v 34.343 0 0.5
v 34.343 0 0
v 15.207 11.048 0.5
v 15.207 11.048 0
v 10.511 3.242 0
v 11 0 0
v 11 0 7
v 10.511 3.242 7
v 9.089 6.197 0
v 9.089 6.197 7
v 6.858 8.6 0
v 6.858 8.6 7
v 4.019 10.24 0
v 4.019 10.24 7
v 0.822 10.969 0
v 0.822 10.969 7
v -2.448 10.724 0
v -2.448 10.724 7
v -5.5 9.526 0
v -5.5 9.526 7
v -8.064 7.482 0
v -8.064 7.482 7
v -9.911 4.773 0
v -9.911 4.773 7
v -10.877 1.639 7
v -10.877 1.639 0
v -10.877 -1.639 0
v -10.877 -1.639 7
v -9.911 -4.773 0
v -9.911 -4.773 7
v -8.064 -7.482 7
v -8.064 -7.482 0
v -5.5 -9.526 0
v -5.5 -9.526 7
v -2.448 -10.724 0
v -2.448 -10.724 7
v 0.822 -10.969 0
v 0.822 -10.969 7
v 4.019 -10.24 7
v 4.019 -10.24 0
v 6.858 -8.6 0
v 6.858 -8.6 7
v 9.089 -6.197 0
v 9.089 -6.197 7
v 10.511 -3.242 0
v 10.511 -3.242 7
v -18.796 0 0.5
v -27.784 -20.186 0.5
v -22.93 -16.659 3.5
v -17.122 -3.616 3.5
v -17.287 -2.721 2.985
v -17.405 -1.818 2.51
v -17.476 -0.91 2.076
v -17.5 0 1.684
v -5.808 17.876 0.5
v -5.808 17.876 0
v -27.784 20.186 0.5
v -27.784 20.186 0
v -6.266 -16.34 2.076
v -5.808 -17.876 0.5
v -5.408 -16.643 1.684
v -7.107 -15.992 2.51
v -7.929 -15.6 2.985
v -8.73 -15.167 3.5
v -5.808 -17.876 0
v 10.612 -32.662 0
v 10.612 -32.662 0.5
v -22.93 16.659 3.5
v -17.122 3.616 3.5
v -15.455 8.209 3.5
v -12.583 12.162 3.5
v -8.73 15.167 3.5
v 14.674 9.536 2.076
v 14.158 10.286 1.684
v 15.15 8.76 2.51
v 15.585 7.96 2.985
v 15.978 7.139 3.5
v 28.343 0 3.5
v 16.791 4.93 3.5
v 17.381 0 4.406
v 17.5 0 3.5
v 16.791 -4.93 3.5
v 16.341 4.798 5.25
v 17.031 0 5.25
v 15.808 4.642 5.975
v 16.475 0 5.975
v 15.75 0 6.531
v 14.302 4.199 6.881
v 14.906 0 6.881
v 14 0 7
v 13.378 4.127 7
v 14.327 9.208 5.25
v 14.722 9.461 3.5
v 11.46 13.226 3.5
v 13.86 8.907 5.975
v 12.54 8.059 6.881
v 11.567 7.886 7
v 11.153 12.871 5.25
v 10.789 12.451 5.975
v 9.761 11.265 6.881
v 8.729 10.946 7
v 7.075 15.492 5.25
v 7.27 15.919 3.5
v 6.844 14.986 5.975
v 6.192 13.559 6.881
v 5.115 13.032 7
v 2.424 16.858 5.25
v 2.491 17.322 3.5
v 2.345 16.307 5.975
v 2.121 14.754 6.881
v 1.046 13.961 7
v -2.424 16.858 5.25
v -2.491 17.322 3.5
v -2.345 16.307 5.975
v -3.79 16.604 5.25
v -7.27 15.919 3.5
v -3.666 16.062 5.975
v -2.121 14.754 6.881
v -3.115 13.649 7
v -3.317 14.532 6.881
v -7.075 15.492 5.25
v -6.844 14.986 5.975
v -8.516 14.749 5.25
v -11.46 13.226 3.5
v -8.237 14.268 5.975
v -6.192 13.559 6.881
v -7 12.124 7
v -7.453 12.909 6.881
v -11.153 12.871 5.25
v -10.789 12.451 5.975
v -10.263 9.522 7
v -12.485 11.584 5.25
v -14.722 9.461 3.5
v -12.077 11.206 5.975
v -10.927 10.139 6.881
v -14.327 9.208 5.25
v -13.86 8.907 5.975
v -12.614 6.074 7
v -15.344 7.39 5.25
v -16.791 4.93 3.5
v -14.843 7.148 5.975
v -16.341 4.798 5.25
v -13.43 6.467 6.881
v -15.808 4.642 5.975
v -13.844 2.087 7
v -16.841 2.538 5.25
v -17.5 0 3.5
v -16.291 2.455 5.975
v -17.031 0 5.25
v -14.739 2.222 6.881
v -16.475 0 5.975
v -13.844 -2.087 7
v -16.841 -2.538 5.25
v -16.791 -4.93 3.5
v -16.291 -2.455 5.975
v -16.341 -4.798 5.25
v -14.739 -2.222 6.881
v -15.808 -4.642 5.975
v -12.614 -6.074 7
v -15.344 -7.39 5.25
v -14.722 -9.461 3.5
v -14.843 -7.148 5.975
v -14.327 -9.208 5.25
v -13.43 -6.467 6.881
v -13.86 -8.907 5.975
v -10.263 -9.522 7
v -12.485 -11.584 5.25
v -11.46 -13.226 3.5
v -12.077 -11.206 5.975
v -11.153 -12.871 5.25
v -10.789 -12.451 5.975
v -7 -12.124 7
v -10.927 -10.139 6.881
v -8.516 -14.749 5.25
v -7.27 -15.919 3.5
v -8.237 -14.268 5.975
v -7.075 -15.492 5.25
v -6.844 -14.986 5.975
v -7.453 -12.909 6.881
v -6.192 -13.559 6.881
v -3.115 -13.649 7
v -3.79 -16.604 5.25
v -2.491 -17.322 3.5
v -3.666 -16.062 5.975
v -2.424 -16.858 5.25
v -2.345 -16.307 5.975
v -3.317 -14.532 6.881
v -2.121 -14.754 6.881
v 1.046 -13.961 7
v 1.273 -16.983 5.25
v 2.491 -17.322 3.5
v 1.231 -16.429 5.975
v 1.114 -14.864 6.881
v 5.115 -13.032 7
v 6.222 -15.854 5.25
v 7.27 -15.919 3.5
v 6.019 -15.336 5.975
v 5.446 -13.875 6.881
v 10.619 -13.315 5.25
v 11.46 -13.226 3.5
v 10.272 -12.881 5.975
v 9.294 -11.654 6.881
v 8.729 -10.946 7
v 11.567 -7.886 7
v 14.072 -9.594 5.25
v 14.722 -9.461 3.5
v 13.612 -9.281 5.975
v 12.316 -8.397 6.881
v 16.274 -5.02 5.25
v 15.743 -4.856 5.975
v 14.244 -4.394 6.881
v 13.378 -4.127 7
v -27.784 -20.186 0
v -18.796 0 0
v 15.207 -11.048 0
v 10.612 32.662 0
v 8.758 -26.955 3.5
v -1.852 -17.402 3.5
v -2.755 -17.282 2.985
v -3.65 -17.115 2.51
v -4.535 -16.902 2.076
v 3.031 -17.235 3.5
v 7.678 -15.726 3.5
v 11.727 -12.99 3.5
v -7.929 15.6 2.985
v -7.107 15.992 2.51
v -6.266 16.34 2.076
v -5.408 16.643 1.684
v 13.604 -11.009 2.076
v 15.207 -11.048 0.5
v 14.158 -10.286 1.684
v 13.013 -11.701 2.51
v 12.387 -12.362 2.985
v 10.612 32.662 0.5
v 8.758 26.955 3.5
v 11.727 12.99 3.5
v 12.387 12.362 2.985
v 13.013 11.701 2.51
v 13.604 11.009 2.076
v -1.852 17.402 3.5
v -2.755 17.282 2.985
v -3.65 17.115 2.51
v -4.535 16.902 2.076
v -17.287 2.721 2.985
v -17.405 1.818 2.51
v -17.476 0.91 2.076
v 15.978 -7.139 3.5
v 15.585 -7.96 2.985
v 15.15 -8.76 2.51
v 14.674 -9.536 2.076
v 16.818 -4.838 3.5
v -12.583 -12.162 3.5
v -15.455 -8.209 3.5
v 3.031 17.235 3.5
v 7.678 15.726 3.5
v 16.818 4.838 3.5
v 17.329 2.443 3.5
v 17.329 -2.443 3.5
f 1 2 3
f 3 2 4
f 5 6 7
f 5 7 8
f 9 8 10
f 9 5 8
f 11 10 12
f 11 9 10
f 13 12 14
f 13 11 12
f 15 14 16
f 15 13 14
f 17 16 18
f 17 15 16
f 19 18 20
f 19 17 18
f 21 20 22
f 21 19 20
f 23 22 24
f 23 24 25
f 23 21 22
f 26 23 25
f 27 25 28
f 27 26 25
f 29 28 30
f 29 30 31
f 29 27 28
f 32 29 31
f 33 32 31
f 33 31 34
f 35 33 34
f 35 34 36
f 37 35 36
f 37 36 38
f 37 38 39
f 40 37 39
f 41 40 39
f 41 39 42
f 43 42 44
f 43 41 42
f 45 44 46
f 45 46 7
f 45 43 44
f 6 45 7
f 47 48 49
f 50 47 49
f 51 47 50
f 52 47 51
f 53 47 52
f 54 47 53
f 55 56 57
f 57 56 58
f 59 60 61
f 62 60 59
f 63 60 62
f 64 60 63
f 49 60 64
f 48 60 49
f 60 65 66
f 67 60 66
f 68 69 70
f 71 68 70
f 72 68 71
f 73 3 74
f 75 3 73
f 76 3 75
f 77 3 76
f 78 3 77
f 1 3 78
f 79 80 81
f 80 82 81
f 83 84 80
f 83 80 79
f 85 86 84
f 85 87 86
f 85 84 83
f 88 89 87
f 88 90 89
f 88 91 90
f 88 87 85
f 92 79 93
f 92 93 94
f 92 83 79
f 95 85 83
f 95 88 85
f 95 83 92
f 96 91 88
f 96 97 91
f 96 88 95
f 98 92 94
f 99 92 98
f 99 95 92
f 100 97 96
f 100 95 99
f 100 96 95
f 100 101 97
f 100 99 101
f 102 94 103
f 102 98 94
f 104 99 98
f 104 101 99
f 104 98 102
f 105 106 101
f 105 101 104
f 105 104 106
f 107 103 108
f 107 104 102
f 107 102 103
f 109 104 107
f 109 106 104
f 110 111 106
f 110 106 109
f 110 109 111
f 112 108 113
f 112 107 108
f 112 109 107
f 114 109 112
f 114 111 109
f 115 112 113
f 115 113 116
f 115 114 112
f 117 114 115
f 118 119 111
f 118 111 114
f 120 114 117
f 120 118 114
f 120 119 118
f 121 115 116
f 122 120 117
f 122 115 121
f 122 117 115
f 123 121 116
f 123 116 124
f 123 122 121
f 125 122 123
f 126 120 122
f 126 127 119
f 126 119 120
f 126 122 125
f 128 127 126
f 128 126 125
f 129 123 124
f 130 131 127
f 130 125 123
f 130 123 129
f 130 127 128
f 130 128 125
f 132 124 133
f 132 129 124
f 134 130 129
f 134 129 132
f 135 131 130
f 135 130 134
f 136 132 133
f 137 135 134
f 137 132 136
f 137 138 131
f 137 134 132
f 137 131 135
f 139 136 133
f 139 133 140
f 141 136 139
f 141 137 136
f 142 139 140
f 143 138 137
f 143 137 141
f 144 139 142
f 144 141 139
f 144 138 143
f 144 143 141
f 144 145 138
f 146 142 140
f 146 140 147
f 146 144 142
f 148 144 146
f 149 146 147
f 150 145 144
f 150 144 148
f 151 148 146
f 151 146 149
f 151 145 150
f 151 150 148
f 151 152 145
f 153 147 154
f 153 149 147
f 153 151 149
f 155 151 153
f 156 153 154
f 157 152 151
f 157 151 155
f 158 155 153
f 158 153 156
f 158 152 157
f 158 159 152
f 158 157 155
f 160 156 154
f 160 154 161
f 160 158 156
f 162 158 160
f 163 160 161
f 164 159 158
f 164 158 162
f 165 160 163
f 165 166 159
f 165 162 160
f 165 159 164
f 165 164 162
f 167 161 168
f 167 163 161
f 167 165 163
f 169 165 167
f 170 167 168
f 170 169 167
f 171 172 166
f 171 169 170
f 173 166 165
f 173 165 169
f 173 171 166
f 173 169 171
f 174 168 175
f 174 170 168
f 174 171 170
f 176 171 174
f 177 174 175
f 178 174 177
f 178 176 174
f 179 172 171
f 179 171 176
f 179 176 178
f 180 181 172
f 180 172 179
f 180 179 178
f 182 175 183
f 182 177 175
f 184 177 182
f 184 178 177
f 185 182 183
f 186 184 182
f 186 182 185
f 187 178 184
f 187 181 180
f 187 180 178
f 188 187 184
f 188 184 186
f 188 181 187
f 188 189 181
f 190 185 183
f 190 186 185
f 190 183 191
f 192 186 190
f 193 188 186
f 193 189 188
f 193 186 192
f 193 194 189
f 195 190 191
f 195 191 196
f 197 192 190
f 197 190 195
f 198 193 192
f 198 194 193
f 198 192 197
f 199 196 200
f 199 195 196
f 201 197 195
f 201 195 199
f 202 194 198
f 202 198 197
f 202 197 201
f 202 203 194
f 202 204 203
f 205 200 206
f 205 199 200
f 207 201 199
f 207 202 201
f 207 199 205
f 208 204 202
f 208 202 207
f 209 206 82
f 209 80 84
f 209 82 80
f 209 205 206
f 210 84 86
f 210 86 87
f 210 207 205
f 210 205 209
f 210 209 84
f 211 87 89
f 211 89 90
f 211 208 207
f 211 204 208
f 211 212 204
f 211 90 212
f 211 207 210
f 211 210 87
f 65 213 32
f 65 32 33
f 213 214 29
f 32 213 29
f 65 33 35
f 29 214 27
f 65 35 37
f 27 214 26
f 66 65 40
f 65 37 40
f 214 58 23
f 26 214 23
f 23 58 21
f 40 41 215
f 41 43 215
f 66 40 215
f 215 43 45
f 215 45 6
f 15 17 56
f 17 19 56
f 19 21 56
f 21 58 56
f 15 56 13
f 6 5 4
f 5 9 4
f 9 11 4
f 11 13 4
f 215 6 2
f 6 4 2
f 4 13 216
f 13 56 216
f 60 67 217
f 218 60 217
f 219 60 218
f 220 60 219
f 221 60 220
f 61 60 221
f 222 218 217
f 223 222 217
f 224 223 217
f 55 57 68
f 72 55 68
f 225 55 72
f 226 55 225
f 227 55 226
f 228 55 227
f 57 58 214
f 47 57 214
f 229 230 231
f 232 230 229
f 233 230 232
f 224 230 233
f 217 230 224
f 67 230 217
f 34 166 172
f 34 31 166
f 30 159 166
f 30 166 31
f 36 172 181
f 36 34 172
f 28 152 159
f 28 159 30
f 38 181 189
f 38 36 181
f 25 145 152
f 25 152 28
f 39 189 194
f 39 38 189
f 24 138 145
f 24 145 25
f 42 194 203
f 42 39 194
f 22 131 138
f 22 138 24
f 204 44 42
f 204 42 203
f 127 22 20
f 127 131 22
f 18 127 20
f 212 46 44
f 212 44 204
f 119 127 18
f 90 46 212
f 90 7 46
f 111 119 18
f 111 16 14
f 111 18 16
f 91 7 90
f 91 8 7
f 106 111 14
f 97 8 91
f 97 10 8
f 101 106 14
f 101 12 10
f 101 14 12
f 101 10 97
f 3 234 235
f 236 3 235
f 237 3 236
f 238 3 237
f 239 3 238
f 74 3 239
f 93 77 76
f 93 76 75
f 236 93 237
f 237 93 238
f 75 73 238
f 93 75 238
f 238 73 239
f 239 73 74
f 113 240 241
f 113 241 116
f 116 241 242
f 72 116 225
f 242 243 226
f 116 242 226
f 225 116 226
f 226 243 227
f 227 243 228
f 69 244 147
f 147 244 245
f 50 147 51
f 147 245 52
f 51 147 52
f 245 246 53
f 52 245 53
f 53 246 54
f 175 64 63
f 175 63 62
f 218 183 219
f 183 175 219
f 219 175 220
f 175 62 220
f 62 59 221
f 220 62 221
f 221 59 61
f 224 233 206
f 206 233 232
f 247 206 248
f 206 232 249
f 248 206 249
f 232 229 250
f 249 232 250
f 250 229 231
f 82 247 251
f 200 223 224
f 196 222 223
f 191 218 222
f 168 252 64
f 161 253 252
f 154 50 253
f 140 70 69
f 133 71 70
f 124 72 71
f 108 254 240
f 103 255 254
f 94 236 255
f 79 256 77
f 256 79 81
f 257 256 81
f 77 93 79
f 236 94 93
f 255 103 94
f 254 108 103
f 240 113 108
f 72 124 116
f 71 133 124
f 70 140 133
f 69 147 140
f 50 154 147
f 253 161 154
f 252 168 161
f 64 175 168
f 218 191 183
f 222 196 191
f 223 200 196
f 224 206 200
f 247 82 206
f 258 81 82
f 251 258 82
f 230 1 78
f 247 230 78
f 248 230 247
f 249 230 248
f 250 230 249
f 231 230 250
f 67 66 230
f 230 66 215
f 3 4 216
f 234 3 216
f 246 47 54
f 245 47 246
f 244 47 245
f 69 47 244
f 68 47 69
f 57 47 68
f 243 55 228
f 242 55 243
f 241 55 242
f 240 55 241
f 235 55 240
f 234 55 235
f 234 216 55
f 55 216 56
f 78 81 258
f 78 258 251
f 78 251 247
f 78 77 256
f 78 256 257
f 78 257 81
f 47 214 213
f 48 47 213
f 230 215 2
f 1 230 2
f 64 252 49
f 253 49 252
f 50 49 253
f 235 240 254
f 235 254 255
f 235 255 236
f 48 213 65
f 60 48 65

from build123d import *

# Parameters (mm, degrees)
F0_R          = 17.5
F0_R_2        = 11
F1_DEPTH      = 7
F3_DEPTH      = 3.5
F4_T4_DEPTH   = 37.5265318242
F4_T9_DEPTH   = 37.5265318242
F4_T14_DEPTH  = 37.5265318242
F4_T19_DEPTH  = 37.5265318242
F4_T24_DEPTH  = 37.5265318242
F4_T29_DEPTH  = 37.5265318242
F4_T34_DEPTH  = 37.5265318242
F4_T39_DEPTH  = 37.5265318242
F4_T44_DEPTH  = 37.5265318242
F4_T49_DEPTH  = 37.5265318242
F4_T55_DEPTH  = 37.5265318242
F4_S57_R      = 17.5
F4_T58_DEPTH  = 21
F4_T61_DEPTH  = 37.5265318242
F4_S63_R      = 17.5
F4_T64_DEPTH  = 22
F4_T70_DEPTH  = 37.5265318242
F4_S72_R      = 17.5
F4_T73_DEPTH  = 21
F4_T76_DEPTH  = 37.5265318242
F4_S78_R      = 17.5
F4_T79_DEPTH  = 22
F4_T85_DEPTH  = 37.5265318242
F4_S87_R      = 17.5
F4_T88_DEPTH  = 21
F4_T91_DEPTH  = 37.5265318242
F4_S93_R      = 17.5
F4_T94_DEPTH  = 22
F4_T100_DEPTH = 37.5265318242
F4_S102_R     = 17.5
F4_T103_DEPTH = 21
F4_T106_DEPTH = 37.5265318242
F4_S108_R     = 17.5
F4_T109_DEPTH = 21
F4_T115_DEPTH = 37.5265318242
F4_S117_R     = 17.5
F4_T118_DEPTH = 21
F4_T121_DEPTH = 37.5265318242
F4_S123_R     = 17.5
F4_T124_DEPTH = 22
F5_R          = 3.49999


# Not quite as in the source:
# - a fillet or chamfer that OpenCascade refuses, or shapes differently, is made with other operations: its cross-section is extruded or revolved along the edge and cut away or added
# - a fillet or chamfer is up to 0.001 mm smaller than in the source, because OpenCascade refuses the exact size


with BuildPart() as f1:
    # F0 (on Top) → F1 (new body)
    with BuildSketch(Plane.XY):
        Circle(F0_R)
        Circle(F0_R_2, mode=Mode.SUBTRACT)
    extrude(amount=F1_DEPTH)

    # F2 (on Top) → F3 (join)
    with BuildSketch(Plane.XY):
        Polygon((15.2065660609, 11.0482169482), (11.0207545101, 13.4648963738), (11.0207545101, 8.0070468423), (16.211477872, 6.3204785843), align=None)
        Polygon((11.0207545101, 8.0070468423), (11.0207545101, 13.4648963738), (15.2065660609, 11.0482169482), (10.6124591285, 32.6617907487), (-5.8083913831, 17.8763905373), (-1.0015101774, 17.3711669641), (-4.2095536412, 12.9556739404), align=None)
        Polygon((16.211477872, 6.3204785843), (11.0207545101, 8.0070468423), (11.0207545101, -8.0070468423), (16.211477872, -6.3204785843), (15.2065660609, -11.0482169482), (34.3426391482, 0), (15.2065660609, 11.0482169482), align=None)
        Polygon((16.211477872, -6.3204785843), (11.0207545101, -8.0070468423), (11.0207545101, -13.4648963738), (15.2065660609, -11.0482169482), align=None)
        Polygon((11.0207545101, -13.4648963738), (11.0207545101, -8.0070468423), (-4.2095536412, -12.9556739404), (-1.0015101774, -17.3711669641), (-5.8083913831, -17.8763905373), (10.6124591285, -32.6617907487), (15.2065660609, -11.0482169482), align=None)
        Polygon((-13.6224017379, 0), (-4.2095536412, 12.9556739404), (-9.4002770031, 14.6422421984), (-5.8083913831, 17.8763905373), (-27.7837787026, 20.1860968161), (-18.7963493557, 0), (-16.8304452017, 4.4154930237), align=None)
        Polygon((-9.4002770031, 14.6422421984), (-4.2095536412, 12.9556739404), (-1.0015101774, 17.3711669641), (-5.8083913831, 17.8763905373), align=None)
        Polygon((-9.4002770031, -14.6422421984), (-4.2095536412, -12.9556739404), (-13.6224017379, 0), (-16.8304452017, -4.4154930237), (-18.7963493557, 0), (-27.7837787026, -20.1860968161), (-5.8083913831, -17.8763905373), align=None)
        Polygon((-1.0015101774, -17.3711669641), (-4.2095536412, -12.9556739404), (-9.4002770031, -14.6422421984), (-5.8083913831, -17.8763905373), align=None)
        Polygon((-16.8304452017, -4.4154930237), (-13.6224017379, 0), (-16.8304452017, 4.4154930237), (-18.7963493557, 0), align=None)
    extrude(amount=F3_DEPTH)

    # F4: chamfer of 3 on 10 edges, made by hand


with BuildPart() as f4_tool2:
    # F4_s3 → F4_t4 (new body)
    with BuildSketch(Plane(origin=(0.0145298929, -0.0683577716, 0), x_dir=(0, 0, 1), z_dir=(-0.2079116908, 0.9781476007, 0))):
        Polygon((0.5, 17.1713195741), (3.5, 14.1713195741), (3.5, 17.1713195741), align=None)
    extrude(amount=F4_T4_DEPTH)

    split(bisect_by=Plane(origin=(8.5856597871, 14.8707989677, 0), x_dir=(0, 0, 1), z_dir=(0.5, 0.8660254038, 0)), keep=Keep.TOP)


with BuildPart() as f1_1:
    add(f1.part)

    # F4_t1: cut F4_tool2
    add(f4_tool2.part, mode=Mode.SUBTRACT)


with BuildPart() as f4_tool7:
    # F4_s8 → F4_t9 (new body)
    with BuildSketch(Plane(origin=(32.4384077554, -18.7283234496, 0), x_dir=(0, 0, 1), z_dir=(-0.8660254038, 0.5, 0))):
        Polygon((0.5, 17.1713195741), (3.5, 14.1713195741), (3.5, 17.1713195741), align=None)
    extrude(amount=F4_T9_DEPTH)

    split(bisect_by=Plane(origin=(16.7960850429, 3.5701180862, 0), x_dir=(0, 0, 1), z_dir=(0.9781476007, 0.2079116908, 0)), keep=Keep.TOP)


with BuildPart() as f1_2:
    add(f1_1.part)

    # F4_t6: cut F4_tool7
    add(f4_tool7.part, mode=Mode.SUBTRACT)


with BuildPart() as f4_tool12:
    # F4_s13 → F4_t14 (new body)
    with BuildSketch(Plane(origin=(-0.0605221203, -0.0349424625, 0), x_dir=(0, 0, 1), z_dir=(0.8660254038, 0.5, 0))):
        Polygon((0.5, 17.1713195741), (3.5, 14.1713195741), (3.5, 17.1713195741), align=None)
    extrude(amount=F4_T14_DEPTH)

    split(bisect_by=Plane(origin=(16.7960850429, -3.5701180862, 0), x_dir=(0, 0, 1), z_dir=(0.9781476007, -0.2079116908, 0)), keep=Keep.TOP)


with BuildPart() as f1_3:
    add(f1_2.part)

    # F4_t11: cut F4_tool12
    add(f4_tool12.part, mode=Mode.SUBTRACT)


with BuildPart() as f4_tool17:
    # F4_s18 → F4_t19 (new body)
    with BuildSketch(Plane(origin=(-7.7876747892, -36.6381292961, 0), x_dir=(0, 0, 1), z_dir=(0.2079116908, 0.9781476007, 0))):
        Polygon((0.5, 17.1713195741), (3.5, 14.1713195741), (3.5, 17.1713195741), align=None)
    extrude(amount=F4_T19_DEPTH)

    split(bisect_by=Plane(origin=(8.5856597871, -14.8707989677, 0), x_dir=(0, 0, 1), z_dir=(0.5, -0.8660254038, 0)), keep=Keep.TOP)


with BuildPart() as f1_4:
    add(f1_3.part)

    # F4_t16: cut F4_tool17
    add(f4_tool17.part, mode=Mode.SUBTRACT)


with BuildPart() as f4_tool22:
    # F4_s23 → F4_t24 (new body)
    with BuildSketch(Plane(origin=(-0.0519346203, 0.0467621422, 0), x_dir=(0, 0, 1), z_dir=(0.7431448255, -0.6691306064, 0))):
        Polygon((0.5, 17.1713195741), (3.5, 14.1713195741), (3.5, 17.1713195741), align=None)
    extrude(amount=F4_T24_DEPTH)

    split(bisect_by=Plane(origin=(1.7948916474, -17.0772532888, 0), x_dir=(0, 0, 1), z_dir=(0.1045284633, -0.9945218954, 0)), keep=Keep.TOP)


with BuildPart() as f1_5:
    add(f1_4.part)

    # F4_t21: cut F4_tool22
    add(f4_tool22.part, mode=Mode.SUBTRACT)


with BuildPart() as f4_tool27:
    # F4_s28 → F4_t29 (new body)
    with BuildSketch(Plane(origin=(-37.2514554684, -3.9152857395, 0), x_dir=(0, 0, 1), z_dir=(0.9945218954, 0.1045284633, 0))):
        Polygon((0.5, 17.1713195741), (3.5, 14.1713195741), (3.5, 17.1713195741), align=None)
    extrude(amount=F4_T29_DEPTH)

    split(bisect_by=Plane(origin=(-11.4898554786, -12.7607772881, 0), x_dir=(0, 0, 1), z_dir=(-0.6691306064, -0.7431448255, 0)), keep=Keep.TOP)


with BuildPart() as f1_6:
    add(f1_5.part)

    # F4_t26: cut F4_tool27
    add(f4_tool27.part, mode=Mode.SUBTRACT)


with BuildPart() as f4_tool32:
    # F4_s33 → F4_t34 (new body)
    with BuildSketch(Plane(origin=(0.0284247598, 0.0638430557, 0), x_dir=(0, 0, 1), z_dir=(-0.4067366431, -0.9135454576, 0))):
        Polygon((0.5, 17.1713195741), (3.5, 14.1713195741), (3.5, 17.1713195741), align=None)
    extrude(amount=F4_T34_DEPTH)

    split(bisect_by=Plane(origin=(-15.6867809987, -6.9842048808, 0), x_dir=(0, 0, 1), z_dir=(-0.9135454576, -0.4067366431, 0)), keep=Keep.TOP)


with BuildPart() as f1_7:
    add(f1_6.part)

    # F4_t31: cut F4_tool32
    add(f4_tool32.part, mode=Mode.SUBTRACT)


with BuildPart() as f4_tool37:
    # F4_s38 → F4_t39 (new body)
    with BuildSketch(Plane(origin=(-15.2349908207, 34.2183496334, 0), x_dir=(0, 0, 1), z_dir=(0.4067366431, -0.9135454576, 0))):
        Polygon((0.5, 17.1713195741), (3.5, 14.1713195741), (3.5, 17.1713195741), align=None)
    extrude(amount=F4_T39_DEPTH)

    split(bisect_by=Plane(origin=(-15.6867809987, 6.9842048808, 0), x_dir=(0, 0, 1), z_dir=(-0.9135454576, 0.4067366431, 0)), keep=Keep.TOP)


with BuildPart() as f1_8:
    add(f1_7.part)

    # F4_t36: cut F4_tool37
    add(f4_tool37.part, mode=Mode.SUBTRACT)


with BuildPart() as f4_tool42:
    # F4_s43 → F4_t44 (new body)
    with BuildSketch(Plane(origin=(0.069502088, -0.0073049638, 0), x_dir=(0, 0, 1), z_dir=(-0.9945218954, 0.1045284633, 0))):
        Polygon((0.5, 17.1713195741), (3.5, 14.1713195741), (3.5, 17.1713195741), align=None)
    extrude(amount=F4_T44_DEPTH)

    split(bisect_by=Plane(origin=(-11.4898554786, 12.7607772881, 0), x_dir=(0, 0, 1), z_dir=(-0.6691306064, 0.7431448255, 0)), keep=Keep.TOP)


with BuildPart() as f1_9:
    add(f1_8.part)

    # F4_t41: cut F4_tool42
    add(f4_tool42.part, mode=Mode.SUBTRACT)


with BuildPart() as f4_tool47:
    # F4_s48 → F4_t49 (new body)
    with BuildSketch(Plane(origin=(27.8357133229, 25.0633888519, 0), x_dir=(0, 0, 1), z_dir=(-0.7431448255, -0.6691306064, 0))):
        Polygon((0.5, 17.1713195741), (3.5, 14.1713195741), (3.5, 17.1713195741), align=None)
    extrude(amount=F4_T49_DEPTH)

    split(bisect_by=Plane(origin=(1.7948916474, 17.0772532888, 0), x_dir=(0, 0, 1), z_dir=(0.1045284633, 0.9945218954, 0)), keep=Keep.TOP)


with BuildPart() as f1_10:
    add(f1_9.part)

    # F4_t46: cut F4_tool47
    add(f4_tool47.part, mode=Mode.SUBTRACT)


with BuildPart() as f4_tool53:
    # F4_s54 → F4_t55 (new body)
    with BuildSketch(Plane(origin=(0.0145298929, -0.0683577716, 0), x_dir=(0, 0, 1), z_dir=(-0.2079116908, 0.9781476007, 0))):
        Polygon((0.5, 17.1713195741), (3.5, 14.1713195741), (3.5, 17.1713195741), align=None)
    extrude(amount=F4_T55_DEPTH)

    split(bisect_by=Plane(origin=(8.5856597871, 14.8707989677, 0), x_dir=(0, 0, 1), z_dir=(-0.5, -0.8660254038, 0)), keep=Keep.TOP)

    # F4_s57 → F4_t58 (cut, symmetric)
    with BuildSketch(Plane.XY.offset(2)):
        Circle(F4_S57_R)
    extrude(amount=F4_T58_DEPTH, both=True, mode=Mode.SUBTRACT)


with BuildPart() as f4_tool59:
    # F4_s60 → F4_t61 (new body)
    with BuildSketch(Plane(origin=(32.4384077554, -18.7283234496, 0), x_dir=(0, 0, 1), z_dir=(-0.8660254038, 0.5, 0))):
        Polygon((0.5, 17.1713195741), (3.5, 14.1713195741), (3.5, 17.1713195741), align=None)
    extrude(amount=F4_T61_DEPTH)

    split(bisect_by=Plane(origin=(16.7960850429, 3.5701180862, 0), x_dir=(0, 0, 1), z_dir=(-0.9781476007, -0.2079116908, 0)), keep=Keep.TOP)

    # F4_s63 → F4_t64 (cut, symmetric)
    with BuildSketch(Plane.XY.offset(2)):
        Circle(F4_S63_R)
    extrude(amount=F4_T64_DEPTH, both=True, mode=Mode.SUBTRACT)


with BuildPart() as f4_tool53_1:
    add(f4_tool53.part)

    # F4_t65: intersect F4_tool59
    add(f4_tool59.part, mode=Mode.INTERSECT)


with BuildPart() as f1_11:
    add(f1_10.part)

    # F4_t51: cut F4_tool53
    add(f4_tool53_1.part, mode=Mode.SUBTRACT)


with BuildPart() as f4_tool68:
    # F4_s69 → F4_t70 (new body)
    with BuildSketch(Plane(origin=(-7.7876747892, -36.6381292961, 0), x_dir=(0, 0, 1), z_dir=(0.2079116908, 0.9781476007, 0))):
        Polygon((0.5, 17.1713195741), (3.5, 14.1713195741), (3.5, 17.1713195741), align=None)
    extrude(amount=F4_T70_DEPTH)

    split(bisect_by=Plane(origin=(8.5856597871, -14.8707989677, 0), x_dir=(0, 0, 1), z_dir=(-0.5, 0.8660254038, 0)), keep=Keep.TOP)

    # F4_s72 → F4_t73 (cut, symmetric)
    with BuildSketch(Plane.XY.offset(2)):
        Circle(F4_S72_R)
    extrude(amount=F4_T73_DEPTH, both=True, mode=Mode.SUBTRACT)


with BuildPart() as f4_tool74:
    # F4_s75 → F4_t76 (new body)
    with BuildSketch(Plane(origin=(-0.0605221203, -0.0349424625, 0), x_dir=(0, 0, 1), z_dir=(0.8660254038, 0.5, 0))):
        Polygon((0.5, 17.1713195741), (3.5, 14.1713195741), (3.5, 17.1713195741), align=None)
    extrude(amount=F4_T76_DEPTH)

    split(bisect_by=Plane(origin=(16.7960850429, -3.5701180862, 0), x_dir=(0, 0, 1), z_dir=(-0.9781476007, 0.2079116908, 0)), keep=Keep.TOP)

    # F4_s78 → F4_t79 (cut, symmetric)
    with BuildSketch(Plane.XY.offset(2)):
        Circle(F4_S78_R)
    extrude(amount=F4_T79_DEPTH, both=True, mode=Mode.SUBTRACT)


with BuildPart() as f4_tool68_1:
    add(f4_tool68.part)

    # F4_t80: intersect F4_tool74
    add(f4_tool74.part, mode=Mode.INTERSECT)


with BuildPart() as f1_12:
    add(f1_11.part)

    # F4_t66: cut F4_tool68
    add(f4_tool68_1.part, mode=Mode.SUBTRACT)


with BuildPart() as f4_tool83:
    # F4_s84 → F4_t85 (new body)
    with BuildSketch(Plane(origin=(-37.2514554684, -3.9152857395, 0), x_dir=(0, 0, 1), z_dir=(0.9945218954, 0.1045284633, 0))):
        Polygon((0.5, 17.1713195741), (3.5, 14.1713195741), (3.5, 17.1713195741), align=None)
    extrude(amount=F4_T85_DEPTH)

    split(bisect_by=Plane(origin=(-11.4898554786, -12.7607772881, 0), x_dir=(0, 0, 1), z_dir=(0.6691306064, 0.7431448255, 0)), keep=Keep.TOP)

    # F4_s87 → F4_t88 (cut, symmetric)
    with BuildSketch(Plane.XY.offset(2)):
        Circle(F4_S87_R)
    extrude(amount=F4_T88_DEPTH, both=True, mode=Mode.SUBTRACT)


with BuildPart() as f4_tool89:
    # F4_s90 → F4_t91 (new body)
    with BuildSketch(Plane(origin=(-0.0519346203, 0.0467621422, 0), x_dir=(0, 0, 1), z_dir=(0.7431448255, -0.6691306064, 0))):
        Polygon((0.5, 17.1713195741), (3.5, 14.1713195741), (3.5, 17.1713195741), align=None)
    extrude(amount=F4_T91_DEPTH)

    split(bisect_by=Plane(origin=(1.7948916474, -17.0772532888, 0), x_dir=(0, 0, 1), z_dir=(-0.1045284633, 0.9945218954, 0)), keep=Keep.TOP)

    # F4_s93 → F4_t94 (cut, symmetric)
    with BuildSketch(Plane.XY.offset(2)):
        Circle(F4_S93_R)
    extrude(amount=F4_T94_DEPTH, both=True, mode=Mode.SUBTRACT)


with BuildPart() as f4_tool83_1:
    add(f4_tool83.part)

    # F4_t95: intersect F4_tool89
    add(f4_tool89.part, mode=Mode.INTERSECT)


with BuildPart() as f1_13:
    add(f1_12.part)

    # F4_t81: cut F4_tool83
    add(f4_tool83_1.part, mode=Mode.SUBTRACT)


with BuildPart() as f4_tool98:
    # F4_s99 → F4_t100 (new body)
    with BuildSketch(Plane(origin=(-15.2349908207, 34.2183496334, 0), x_dir=(0, 0, 1), z_dir=(0.4067366431, -0.9135454576, 0))):
        Polygon((0.5, 17.1713195741), (3.5, 14.1713195741), (3.5, 17.1713195741), align=None)
    extrude(amount=F4_T100_DEPTH)

    split(bisect_by=Plane(origin=(-15.6867809987, 6.9842048808, 0), x_dir=(0, 0, 1), z_dir=(0.9135454576, -0.4067366431, 0)), keep=Keep.TOP)

    # F4_s102 → F4_t103 (cut, symmetric)
    with BuildSketch(Plane.XY.offset(2)):
        Circle(F4_S102_R)
    extrude(amount=F4_T103_DEPTH, both=True, mode=Mode.SUBTRACT)


with BuildPart() as f4_tool104:
    # F4_s105 → F4_t106 (new body)
    with BuildSketch(Plane(origin=(0.0284247598, 0.0638430557, 0), x_dir=(0, 0, 1), z_dir=(-0.4067366431, -0.9135454576, 0))):
        Polygon((0.5, 17.1713195741), (3.5, 14.1713195741), (3.5, 17.1713195741), align=None)
    extrude(amount=F4_T106_DEPTH)

    split(bisect_by=Plane(origin=(-15.6867809987, -6.9842048808, 0), x_dir=(0, 0, 1), z_dir=(0.9135454576, 0.4067366431, 0)), keep=Keep.TOP)

    # F4_s108 → F4_t109 (cut, symmetric)
    with BuildSketch(Plane.XY.offset(2)):
        Circle(F4_S108_R)
    extrude(amount=F4_T109_DEPTH, both=True, mode=Mode.SUBTRACT)


with BuildPart() as f4_tool98_1:
    add(f4_tool98.part)

    # F4_t110: intersect F4_tool104
    add(f4_tool104.part, mode=Mode.INTERSECT)


with BuildPart() as f1_14:
    add(f1_13.part)

    # F4_t96: cut F4_tool98
    add(f4_tool98_1.part, mode=Mode.SUBTRACT)


with BuildPart() as f4_tool113:
    # F4_s114 → F4_t115 (new body)
    with BuildSketch(Plane(origin=(0.069502088, -0.0073049638, 0), x_dir=(0, 0, 1), z_dir=(-0.9945218954, 0.1045284633, 0))):
        Polygon((0.5, 17.1713195741), (3.5, 14.1713195741), (3.5, 17.1713195741), align=None)
    extrude(amount=F4_T115_DEPTH)

    split(bisect_by=Plane(origin=(-11.4898554786, 12.7607772881, 0), x_dir=(0, 0, 1), z_dir=(0.6691306064, -0.7431448255, 0)), keep=Keep.TOP)

    # F4_s117 → F4_t118 (cut, symmetric)
    with BuildSketch(Plane.XY.offset(2)):
        Circle(F4_S117_R)
    extrude(amount=F4_T118_DEPTH, both=True, mode=Mode.SUBTRACT)


with BuildPart() as f4_tool119:
    # F4_s120 → F4_t121 (new body)
    with BuildSketch(Plane(origin=(27.8357133229, 25.0633888519, 0), x_dir=(0, 0, 1), z_dir=(-0.7431448255, -0.6691306064, 0))):
        Polygon((0.5, 17.1713195741), (3.5, 14.1713195741), (3.5, 17.1713195741), align=None)
    extrude(amount=F4_T121_DEPTH)

    split(bisect_by=Plane(origin=(1.7948916474, 17.0772532888, 0), x_dir=(0, 0, 1), z_dir=(-0.1045284633, -0.9945218954, 0)), keep=Keep.TOP)

    # F4_s123 → F4_t124 (cut, symmetric)
    with BuildSketch(Plane.XY.offset(2)):
        Circle(F4_S123_R)
    extrude(amount=F4_T124_DEPTH, both=True, mode=Mode.SUBTRACT)


with BuildPart() as f4_tool113_1:
    add(f4_tool113.part)

    # F4_t125: intersect F4_tool119
    add(f4_tool119.part, mode=Mode.INTERSECT)


with BuildPart() as f1_15:
    add(f1_14.part)

    # F4_t111: cut F4_tool113
    add(f4_tool113_1.part, mode=Mode.SUBTRACT)

    # F5 (radius 3.5 in the source; OpenCascade refuses exactly that, so slightly less here)
    f5_edges = [f1_15.edges().sort_by_distance(p)[0] for p in [
        (-17.5, 0, 7),
    ]]
    fillet(f5_edges, radius=F5_R)


solid = f1_15.part
